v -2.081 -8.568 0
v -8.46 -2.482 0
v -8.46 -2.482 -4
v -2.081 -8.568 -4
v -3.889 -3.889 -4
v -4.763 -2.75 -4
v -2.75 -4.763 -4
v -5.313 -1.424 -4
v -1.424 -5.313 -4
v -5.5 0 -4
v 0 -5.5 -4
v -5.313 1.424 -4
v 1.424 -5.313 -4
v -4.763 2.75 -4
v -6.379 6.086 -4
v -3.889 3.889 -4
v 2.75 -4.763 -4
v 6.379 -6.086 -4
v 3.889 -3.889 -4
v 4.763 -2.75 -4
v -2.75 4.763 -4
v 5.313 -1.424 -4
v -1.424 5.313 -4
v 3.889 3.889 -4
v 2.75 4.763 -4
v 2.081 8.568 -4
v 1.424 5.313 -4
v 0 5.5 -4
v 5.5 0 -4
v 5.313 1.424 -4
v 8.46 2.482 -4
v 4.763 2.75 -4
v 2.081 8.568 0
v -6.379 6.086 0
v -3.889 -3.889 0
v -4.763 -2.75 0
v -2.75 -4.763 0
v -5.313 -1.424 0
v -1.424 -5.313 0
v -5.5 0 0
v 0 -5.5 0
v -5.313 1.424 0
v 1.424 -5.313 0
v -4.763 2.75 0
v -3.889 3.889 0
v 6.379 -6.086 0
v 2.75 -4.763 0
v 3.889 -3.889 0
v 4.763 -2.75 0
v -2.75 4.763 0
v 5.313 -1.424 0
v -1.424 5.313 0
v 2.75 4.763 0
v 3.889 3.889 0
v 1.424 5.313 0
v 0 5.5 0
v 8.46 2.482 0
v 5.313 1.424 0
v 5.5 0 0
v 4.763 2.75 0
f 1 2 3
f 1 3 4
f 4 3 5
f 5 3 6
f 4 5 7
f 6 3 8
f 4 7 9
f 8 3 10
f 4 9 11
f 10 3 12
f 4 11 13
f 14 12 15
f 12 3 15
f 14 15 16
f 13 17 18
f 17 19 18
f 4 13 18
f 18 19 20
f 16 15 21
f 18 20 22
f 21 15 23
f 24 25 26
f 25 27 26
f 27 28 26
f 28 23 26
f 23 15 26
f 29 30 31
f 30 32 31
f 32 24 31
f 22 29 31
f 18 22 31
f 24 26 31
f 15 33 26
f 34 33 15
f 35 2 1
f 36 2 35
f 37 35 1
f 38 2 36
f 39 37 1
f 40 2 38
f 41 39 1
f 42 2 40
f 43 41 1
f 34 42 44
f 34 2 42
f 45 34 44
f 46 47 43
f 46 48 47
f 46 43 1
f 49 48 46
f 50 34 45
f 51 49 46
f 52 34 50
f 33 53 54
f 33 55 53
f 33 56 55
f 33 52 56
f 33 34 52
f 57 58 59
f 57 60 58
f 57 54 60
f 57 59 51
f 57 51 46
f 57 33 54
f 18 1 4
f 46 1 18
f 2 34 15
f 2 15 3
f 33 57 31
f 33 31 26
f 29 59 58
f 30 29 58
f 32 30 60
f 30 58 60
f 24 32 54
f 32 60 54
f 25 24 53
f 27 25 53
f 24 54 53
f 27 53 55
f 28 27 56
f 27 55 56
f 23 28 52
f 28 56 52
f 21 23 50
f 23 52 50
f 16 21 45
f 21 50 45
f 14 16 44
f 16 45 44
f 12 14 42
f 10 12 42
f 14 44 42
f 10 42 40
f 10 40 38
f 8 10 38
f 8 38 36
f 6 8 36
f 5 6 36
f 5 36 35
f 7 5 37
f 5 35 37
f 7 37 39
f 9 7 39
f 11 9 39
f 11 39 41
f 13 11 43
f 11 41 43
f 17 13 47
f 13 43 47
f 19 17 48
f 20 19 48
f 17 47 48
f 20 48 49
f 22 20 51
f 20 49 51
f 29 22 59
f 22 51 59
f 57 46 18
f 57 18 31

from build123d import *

# Parameters (mm, degrees)
CROQUIS1_R              = 5.5
SALIENTE_EXTRUIR1_DEPTH = 4


with BuildPart() as part:
    # Croquis1 → Saliente-Extruir1 (new body)
    with BuildSketch(Plane.XY):
        Polygon((2.080750103, 8.567708442), (-6.379478111, 6.085836669), (-8.460228214, -2.481871773), (-2.080750103, -8.567708442), (6.379478111, -6.085836669), (8.460228214, 2.481871773), align=None)
        Circle(CROQUIS1_R, mode=Mode.SUBTRACT)
    extrude(amount=-SALIENTE_EXTRUIR1_DEPTH)


solid = part.part
